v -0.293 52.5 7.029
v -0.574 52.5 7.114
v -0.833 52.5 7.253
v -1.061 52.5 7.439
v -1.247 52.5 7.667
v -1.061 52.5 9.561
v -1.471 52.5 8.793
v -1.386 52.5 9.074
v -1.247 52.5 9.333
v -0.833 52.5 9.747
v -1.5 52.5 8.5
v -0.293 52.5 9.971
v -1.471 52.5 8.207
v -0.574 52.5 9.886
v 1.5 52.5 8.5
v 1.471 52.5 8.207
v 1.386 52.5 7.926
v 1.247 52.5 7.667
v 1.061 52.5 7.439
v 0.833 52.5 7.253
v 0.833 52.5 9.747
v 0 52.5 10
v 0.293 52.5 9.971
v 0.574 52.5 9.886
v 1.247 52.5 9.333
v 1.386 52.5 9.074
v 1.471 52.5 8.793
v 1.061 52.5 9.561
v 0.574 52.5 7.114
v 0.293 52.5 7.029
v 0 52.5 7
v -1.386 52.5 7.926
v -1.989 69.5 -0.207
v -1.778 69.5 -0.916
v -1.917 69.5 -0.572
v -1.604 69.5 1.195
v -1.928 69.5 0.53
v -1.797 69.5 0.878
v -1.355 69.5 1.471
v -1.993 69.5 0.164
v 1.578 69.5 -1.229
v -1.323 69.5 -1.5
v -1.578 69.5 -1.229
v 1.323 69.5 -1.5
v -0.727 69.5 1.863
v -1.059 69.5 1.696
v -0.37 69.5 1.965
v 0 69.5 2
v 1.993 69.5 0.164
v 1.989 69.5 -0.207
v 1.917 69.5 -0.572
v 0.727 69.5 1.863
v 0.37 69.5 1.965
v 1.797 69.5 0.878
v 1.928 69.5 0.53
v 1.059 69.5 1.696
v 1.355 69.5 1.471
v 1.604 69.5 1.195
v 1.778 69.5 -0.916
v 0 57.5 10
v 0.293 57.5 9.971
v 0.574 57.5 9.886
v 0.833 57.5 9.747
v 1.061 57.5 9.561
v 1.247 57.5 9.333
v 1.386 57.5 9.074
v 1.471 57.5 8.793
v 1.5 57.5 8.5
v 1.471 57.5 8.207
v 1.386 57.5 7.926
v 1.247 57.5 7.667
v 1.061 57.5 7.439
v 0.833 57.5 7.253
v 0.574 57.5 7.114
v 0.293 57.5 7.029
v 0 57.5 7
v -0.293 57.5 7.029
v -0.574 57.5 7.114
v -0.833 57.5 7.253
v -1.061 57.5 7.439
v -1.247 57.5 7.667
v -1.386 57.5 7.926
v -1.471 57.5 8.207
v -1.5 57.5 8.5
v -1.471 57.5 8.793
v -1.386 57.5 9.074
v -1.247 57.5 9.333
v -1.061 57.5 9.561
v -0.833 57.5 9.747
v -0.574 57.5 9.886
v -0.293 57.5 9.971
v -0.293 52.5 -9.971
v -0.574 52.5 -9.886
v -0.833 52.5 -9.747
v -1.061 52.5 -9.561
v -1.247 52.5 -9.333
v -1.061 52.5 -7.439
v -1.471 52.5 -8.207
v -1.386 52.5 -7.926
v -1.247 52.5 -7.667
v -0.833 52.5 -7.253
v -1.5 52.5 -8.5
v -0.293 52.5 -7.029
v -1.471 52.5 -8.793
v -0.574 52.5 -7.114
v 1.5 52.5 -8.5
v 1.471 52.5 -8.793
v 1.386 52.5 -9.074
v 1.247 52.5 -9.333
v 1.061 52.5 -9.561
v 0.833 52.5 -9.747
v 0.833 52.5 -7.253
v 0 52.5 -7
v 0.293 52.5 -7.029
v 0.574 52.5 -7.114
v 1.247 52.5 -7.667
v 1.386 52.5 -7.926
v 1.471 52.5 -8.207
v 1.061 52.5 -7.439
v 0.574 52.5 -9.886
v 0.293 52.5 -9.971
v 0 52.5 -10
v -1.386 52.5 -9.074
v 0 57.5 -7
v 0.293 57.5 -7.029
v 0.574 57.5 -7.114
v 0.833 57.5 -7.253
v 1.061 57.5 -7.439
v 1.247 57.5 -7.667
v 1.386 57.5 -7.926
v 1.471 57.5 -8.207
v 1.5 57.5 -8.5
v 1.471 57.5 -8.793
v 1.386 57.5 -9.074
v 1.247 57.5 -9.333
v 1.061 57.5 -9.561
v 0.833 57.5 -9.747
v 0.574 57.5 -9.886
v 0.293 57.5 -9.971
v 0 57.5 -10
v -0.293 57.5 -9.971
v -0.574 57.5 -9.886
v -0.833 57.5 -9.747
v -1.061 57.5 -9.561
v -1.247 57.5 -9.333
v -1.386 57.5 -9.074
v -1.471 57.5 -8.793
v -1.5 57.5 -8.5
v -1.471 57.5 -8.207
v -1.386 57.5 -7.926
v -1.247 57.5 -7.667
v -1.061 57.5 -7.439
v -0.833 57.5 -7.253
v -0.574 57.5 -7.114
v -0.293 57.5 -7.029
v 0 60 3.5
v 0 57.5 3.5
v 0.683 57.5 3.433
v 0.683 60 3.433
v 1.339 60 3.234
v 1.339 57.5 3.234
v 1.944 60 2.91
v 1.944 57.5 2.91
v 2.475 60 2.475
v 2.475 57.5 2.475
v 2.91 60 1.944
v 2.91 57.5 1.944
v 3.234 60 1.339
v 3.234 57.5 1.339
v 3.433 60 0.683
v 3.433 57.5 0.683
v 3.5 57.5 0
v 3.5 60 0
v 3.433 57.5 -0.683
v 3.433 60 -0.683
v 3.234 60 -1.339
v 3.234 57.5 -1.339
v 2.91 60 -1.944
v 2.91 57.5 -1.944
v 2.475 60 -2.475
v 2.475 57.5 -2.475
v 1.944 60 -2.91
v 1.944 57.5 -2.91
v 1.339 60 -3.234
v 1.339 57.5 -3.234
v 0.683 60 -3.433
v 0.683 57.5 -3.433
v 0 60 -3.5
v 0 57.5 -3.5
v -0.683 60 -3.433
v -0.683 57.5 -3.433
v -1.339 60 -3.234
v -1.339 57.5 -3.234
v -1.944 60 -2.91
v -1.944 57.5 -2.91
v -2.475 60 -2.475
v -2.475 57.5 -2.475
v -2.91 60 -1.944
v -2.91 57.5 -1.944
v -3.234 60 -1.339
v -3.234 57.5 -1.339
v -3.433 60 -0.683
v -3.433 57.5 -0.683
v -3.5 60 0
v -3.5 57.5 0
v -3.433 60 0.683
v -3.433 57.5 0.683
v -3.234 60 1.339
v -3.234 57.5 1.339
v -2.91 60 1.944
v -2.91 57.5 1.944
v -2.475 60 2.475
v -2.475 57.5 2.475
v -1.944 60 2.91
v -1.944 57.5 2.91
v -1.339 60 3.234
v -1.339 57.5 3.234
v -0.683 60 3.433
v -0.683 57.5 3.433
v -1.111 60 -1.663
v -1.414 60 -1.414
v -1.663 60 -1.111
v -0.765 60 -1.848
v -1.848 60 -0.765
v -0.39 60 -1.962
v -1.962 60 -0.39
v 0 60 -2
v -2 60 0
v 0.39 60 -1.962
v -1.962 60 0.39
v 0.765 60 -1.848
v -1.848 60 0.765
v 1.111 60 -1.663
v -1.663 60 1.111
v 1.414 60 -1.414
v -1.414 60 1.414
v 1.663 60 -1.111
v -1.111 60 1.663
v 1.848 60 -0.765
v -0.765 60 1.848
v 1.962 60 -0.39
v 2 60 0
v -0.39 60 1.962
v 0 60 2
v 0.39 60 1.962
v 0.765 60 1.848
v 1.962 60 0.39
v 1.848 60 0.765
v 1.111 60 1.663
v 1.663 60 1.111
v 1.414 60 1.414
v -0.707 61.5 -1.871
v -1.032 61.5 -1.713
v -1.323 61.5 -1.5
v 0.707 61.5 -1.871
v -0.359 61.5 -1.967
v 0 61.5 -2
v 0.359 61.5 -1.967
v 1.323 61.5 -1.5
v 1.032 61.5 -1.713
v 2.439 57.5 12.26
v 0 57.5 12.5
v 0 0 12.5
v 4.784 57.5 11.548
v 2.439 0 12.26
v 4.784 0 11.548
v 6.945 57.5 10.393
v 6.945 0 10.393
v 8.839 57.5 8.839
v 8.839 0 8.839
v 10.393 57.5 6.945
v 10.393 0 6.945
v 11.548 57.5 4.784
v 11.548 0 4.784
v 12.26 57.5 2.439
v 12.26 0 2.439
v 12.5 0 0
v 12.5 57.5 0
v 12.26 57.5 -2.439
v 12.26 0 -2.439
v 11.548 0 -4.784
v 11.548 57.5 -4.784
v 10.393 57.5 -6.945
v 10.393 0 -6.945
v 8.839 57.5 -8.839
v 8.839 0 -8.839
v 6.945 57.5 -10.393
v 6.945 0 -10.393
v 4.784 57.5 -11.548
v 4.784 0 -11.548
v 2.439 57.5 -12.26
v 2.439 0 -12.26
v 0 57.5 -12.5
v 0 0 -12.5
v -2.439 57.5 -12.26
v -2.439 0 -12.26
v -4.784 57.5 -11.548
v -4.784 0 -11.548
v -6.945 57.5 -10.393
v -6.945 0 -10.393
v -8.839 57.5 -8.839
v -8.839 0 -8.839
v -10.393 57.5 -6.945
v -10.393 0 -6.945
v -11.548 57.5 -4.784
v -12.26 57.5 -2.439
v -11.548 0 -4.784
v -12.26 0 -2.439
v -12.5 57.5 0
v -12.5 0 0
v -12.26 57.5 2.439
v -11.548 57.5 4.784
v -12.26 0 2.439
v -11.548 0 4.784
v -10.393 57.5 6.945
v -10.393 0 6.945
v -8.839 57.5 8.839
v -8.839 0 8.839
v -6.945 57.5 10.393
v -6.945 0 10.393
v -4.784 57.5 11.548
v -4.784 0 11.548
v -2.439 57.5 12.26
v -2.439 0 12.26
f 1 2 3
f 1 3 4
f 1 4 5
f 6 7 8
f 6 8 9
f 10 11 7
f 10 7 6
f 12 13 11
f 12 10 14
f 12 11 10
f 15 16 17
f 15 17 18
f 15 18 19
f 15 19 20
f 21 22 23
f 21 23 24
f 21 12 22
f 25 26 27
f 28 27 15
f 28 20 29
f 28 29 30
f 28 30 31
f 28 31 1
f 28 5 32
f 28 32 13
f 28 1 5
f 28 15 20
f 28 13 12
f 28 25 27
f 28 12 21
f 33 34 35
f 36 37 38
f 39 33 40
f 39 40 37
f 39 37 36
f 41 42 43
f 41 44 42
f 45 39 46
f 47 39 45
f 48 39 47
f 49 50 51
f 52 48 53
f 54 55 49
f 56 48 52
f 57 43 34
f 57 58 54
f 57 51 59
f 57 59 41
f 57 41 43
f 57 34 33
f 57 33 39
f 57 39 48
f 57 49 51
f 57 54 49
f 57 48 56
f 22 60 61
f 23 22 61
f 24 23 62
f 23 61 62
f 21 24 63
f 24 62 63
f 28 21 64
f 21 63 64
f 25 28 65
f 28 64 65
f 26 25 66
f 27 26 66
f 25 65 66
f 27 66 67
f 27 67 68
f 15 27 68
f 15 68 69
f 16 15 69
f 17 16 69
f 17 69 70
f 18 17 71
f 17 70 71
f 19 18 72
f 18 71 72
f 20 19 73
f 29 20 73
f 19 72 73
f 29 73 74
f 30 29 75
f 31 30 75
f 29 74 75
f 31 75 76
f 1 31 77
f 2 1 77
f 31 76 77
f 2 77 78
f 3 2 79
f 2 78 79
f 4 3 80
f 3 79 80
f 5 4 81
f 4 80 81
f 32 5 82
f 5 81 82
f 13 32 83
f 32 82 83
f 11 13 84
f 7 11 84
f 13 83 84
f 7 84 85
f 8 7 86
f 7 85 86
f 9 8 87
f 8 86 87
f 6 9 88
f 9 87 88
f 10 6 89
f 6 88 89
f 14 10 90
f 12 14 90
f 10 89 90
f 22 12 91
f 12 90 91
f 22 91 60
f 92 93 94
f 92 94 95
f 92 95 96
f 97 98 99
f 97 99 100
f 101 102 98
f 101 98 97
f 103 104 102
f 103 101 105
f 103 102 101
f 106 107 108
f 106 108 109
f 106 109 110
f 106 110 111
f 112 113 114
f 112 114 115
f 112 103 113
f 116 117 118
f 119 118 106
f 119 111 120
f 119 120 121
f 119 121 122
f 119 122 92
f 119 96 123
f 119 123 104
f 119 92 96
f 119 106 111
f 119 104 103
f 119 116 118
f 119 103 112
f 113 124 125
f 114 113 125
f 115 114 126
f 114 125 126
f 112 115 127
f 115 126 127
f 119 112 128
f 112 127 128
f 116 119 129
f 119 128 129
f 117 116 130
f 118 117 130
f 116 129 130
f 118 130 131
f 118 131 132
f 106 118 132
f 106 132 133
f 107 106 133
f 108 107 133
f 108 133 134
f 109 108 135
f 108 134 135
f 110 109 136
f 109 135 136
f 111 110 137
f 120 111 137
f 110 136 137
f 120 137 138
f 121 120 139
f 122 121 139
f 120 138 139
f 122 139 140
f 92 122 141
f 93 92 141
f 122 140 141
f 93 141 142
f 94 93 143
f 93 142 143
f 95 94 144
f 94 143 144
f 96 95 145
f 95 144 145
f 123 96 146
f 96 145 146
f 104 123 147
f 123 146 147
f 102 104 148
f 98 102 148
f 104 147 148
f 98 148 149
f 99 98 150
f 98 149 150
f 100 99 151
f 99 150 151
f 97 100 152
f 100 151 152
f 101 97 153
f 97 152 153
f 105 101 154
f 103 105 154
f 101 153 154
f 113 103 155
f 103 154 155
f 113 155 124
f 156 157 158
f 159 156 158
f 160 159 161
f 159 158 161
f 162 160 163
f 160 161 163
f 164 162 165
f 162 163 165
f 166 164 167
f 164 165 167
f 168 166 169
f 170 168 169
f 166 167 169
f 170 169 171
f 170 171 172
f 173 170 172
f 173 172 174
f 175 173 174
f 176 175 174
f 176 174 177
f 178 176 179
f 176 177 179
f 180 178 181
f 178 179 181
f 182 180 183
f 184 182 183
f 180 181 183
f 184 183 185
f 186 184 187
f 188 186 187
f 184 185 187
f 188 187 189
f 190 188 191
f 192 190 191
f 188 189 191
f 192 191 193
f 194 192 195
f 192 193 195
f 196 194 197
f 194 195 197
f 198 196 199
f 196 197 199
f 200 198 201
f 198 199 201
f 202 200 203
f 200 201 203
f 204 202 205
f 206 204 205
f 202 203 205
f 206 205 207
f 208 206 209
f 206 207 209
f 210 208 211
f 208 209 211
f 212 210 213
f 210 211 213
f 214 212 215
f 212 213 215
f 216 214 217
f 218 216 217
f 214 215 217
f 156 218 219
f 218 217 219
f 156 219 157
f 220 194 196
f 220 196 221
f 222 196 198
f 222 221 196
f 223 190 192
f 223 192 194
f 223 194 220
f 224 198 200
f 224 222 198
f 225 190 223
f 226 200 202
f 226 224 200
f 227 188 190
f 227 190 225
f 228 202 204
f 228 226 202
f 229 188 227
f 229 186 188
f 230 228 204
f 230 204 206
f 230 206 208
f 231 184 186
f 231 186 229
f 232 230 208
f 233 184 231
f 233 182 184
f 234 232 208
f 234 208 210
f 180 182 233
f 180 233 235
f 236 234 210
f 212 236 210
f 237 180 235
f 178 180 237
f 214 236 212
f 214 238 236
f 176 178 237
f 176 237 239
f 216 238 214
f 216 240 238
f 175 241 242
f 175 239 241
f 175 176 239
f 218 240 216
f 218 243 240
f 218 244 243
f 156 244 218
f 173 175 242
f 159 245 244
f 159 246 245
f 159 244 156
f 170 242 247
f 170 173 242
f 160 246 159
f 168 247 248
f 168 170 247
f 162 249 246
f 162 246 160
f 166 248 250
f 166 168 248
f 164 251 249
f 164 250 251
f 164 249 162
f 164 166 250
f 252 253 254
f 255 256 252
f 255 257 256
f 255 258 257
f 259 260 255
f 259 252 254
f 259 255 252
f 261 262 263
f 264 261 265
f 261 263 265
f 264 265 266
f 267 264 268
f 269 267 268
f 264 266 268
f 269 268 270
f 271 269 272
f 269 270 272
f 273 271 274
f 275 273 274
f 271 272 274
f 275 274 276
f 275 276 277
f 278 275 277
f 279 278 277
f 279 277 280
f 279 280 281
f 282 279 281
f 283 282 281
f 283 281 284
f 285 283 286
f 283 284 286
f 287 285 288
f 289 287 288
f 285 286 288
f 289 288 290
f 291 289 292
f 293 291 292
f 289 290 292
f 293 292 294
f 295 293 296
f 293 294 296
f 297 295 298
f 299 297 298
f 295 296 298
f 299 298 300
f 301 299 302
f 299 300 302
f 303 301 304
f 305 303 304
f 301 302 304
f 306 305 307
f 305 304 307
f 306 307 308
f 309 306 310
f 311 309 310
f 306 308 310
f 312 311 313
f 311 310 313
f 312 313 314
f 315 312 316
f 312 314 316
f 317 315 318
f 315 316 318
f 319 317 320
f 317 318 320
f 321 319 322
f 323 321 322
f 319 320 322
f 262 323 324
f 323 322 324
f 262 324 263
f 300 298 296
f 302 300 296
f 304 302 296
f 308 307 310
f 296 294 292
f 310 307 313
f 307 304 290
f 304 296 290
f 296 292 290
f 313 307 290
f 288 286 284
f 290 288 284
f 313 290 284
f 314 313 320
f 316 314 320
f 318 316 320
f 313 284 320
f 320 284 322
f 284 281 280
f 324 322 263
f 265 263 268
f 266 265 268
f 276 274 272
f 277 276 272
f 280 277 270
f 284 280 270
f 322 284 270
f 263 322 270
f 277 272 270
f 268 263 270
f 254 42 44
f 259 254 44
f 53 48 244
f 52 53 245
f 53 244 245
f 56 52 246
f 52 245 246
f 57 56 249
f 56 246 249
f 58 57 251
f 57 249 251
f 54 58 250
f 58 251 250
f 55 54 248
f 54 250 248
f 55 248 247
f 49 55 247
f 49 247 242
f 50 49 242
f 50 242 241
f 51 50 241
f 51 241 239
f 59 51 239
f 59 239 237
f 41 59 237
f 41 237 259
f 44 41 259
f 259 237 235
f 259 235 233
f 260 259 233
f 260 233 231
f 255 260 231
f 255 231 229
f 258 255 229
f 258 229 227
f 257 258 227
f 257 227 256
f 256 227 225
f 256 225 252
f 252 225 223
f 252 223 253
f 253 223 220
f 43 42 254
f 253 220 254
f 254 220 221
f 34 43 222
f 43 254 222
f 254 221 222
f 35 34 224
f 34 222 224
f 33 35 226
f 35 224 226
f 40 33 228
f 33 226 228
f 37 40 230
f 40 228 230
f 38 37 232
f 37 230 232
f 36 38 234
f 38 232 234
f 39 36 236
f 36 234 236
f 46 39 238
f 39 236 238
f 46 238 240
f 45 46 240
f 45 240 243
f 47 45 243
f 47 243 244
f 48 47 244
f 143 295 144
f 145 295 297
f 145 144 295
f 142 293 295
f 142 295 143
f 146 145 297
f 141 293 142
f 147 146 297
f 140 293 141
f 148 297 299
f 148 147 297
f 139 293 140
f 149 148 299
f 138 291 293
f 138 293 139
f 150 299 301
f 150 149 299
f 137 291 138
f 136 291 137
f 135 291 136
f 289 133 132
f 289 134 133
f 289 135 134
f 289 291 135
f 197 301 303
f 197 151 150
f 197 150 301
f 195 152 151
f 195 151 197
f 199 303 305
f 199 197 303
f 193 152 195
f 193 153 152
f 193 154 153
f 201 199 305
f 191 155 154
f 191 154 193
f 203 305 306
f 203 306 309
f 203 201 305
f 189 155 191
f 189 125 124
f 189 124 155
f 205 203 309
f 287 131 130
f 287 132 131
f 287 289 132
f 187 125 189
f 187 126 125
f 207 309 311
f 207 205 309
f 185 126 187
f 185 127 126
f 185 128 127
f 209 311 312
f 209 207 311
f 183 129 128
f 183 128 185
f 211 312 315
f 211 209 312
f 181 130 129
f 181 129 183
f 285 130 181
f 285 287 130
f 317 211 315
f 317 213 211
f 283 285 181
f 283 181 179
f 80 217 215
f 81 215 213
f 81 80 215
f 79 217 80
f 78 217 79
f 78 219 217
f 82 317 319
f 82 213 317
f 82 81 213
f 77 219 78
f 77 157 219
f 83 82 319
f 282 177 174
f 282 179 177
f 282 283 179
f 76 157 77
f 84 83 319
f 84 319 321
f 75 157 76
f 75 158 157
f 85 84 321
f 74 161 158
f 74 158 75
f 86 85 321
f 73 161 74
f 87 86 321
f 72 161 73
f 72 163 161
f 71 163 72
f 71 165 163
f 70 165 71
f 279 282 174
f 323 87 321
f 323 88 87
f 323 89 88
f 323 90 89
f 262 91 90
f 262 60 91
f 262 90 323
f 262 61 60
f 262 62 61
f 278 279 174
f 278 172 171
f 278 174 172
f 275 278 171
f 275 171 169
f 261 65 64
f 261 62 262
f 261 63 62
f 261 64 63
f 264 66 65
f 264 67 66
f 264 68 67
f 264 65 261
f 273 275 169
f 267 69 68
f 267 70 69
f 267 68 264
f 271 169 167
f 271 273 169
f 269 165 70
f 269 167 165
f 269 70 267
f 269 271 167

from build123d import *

# Parameters (mm, degrees)
SKETCH_1_R          = 12.5
EXTRUDE_1_DEPTH     = 57.5
SKETCH_2_R          = 3.5
EXTRUDE_2_DEPTH     = 2.5
SKETCH_3_R          = 2
EXTRUDE_3_DEPTH     = 9.5
CUT_EXTRUDE_1_DEPTH = 8
SKETCH_5_R          = 1.5
CUT_EXTRUDE_2_DEPTH = 5


with BuildPart() as part:
    # 草图1 → 凸台-拉伸1 (new body)
    with BuildSketch(Plane(origin=(0, 0, 0), x_dir=(1, 0, 0), z_dir=(0, 1, 0))):
        with Locations(Location((0, 0, 0), (0, 0, 270))):
            Circle(SKETCH_1_R)
    extrude(amount=EXTRUDE_1_DEPTH)

    # 草图2 → 凸台-拉伸2 (add)
    with BuildSketch(Plane(origin=(0, 57.5, 0), x_dir=(1, 0, 0), z_dir=(0, 1, 0))):
        with Locations(Location((0, 0, 0), (0, 0, 270))):
            Circle(SKETCH_2_R)
    extrude(amount=EXTRUDE_2_DEPTH)

    # 草图3 → 凸台-拉伸3 (add)
    with BuildSketch(Plane(origin=(0, 60, 0), x_dir=(1, 0, 0), z_dir=(0, 1, 0))):
        with Locations(Location((0, 0, 0), (0, 0, 270))):
            Circle(SKETCH_3_R)
    extrude(amount=EXTRUDE_3_DEPTH)

    # 草图4 → 切除-拉伸1 (cut)
    with BuildSketch(Plane(origin=(0, 69.5, 0), x_dir=(1, 0, 0), z_dir=(0, 1, 0))):
        Polygon((-50.671161076, 1.5), (-1.322875656, 1.5), (1.322875656, 1.5), (50.671161076, 1.5), (50.671161076, 100.196570842), (-50.671161076, 100.196570842), align=None)
    extrude(amount=-CUT_EXTRUDE_1_DEPTH, mode=Mode.SUBTRACT)

    # 草图5 → 切除-拉伸2 (cut)
    with BuildSketch(Plane(origin=(0, 57.5, 0), x_dir=(1, 0, 0), z_dir=(0, 1, 0))):
        with Locations(Location((0, 8.5, 0), (0, 0, 270))):
            Circle(SKETCH_5_R)
        with Locations(Location((0, -8.5, 0), (0, 0, 270))):
            Circle(SKETCH_5_R)
    extrude(amount=-CUT_EXTRUDE_2_DEPTH, mode=Mode.SUBTRACT)


solid = part.part
